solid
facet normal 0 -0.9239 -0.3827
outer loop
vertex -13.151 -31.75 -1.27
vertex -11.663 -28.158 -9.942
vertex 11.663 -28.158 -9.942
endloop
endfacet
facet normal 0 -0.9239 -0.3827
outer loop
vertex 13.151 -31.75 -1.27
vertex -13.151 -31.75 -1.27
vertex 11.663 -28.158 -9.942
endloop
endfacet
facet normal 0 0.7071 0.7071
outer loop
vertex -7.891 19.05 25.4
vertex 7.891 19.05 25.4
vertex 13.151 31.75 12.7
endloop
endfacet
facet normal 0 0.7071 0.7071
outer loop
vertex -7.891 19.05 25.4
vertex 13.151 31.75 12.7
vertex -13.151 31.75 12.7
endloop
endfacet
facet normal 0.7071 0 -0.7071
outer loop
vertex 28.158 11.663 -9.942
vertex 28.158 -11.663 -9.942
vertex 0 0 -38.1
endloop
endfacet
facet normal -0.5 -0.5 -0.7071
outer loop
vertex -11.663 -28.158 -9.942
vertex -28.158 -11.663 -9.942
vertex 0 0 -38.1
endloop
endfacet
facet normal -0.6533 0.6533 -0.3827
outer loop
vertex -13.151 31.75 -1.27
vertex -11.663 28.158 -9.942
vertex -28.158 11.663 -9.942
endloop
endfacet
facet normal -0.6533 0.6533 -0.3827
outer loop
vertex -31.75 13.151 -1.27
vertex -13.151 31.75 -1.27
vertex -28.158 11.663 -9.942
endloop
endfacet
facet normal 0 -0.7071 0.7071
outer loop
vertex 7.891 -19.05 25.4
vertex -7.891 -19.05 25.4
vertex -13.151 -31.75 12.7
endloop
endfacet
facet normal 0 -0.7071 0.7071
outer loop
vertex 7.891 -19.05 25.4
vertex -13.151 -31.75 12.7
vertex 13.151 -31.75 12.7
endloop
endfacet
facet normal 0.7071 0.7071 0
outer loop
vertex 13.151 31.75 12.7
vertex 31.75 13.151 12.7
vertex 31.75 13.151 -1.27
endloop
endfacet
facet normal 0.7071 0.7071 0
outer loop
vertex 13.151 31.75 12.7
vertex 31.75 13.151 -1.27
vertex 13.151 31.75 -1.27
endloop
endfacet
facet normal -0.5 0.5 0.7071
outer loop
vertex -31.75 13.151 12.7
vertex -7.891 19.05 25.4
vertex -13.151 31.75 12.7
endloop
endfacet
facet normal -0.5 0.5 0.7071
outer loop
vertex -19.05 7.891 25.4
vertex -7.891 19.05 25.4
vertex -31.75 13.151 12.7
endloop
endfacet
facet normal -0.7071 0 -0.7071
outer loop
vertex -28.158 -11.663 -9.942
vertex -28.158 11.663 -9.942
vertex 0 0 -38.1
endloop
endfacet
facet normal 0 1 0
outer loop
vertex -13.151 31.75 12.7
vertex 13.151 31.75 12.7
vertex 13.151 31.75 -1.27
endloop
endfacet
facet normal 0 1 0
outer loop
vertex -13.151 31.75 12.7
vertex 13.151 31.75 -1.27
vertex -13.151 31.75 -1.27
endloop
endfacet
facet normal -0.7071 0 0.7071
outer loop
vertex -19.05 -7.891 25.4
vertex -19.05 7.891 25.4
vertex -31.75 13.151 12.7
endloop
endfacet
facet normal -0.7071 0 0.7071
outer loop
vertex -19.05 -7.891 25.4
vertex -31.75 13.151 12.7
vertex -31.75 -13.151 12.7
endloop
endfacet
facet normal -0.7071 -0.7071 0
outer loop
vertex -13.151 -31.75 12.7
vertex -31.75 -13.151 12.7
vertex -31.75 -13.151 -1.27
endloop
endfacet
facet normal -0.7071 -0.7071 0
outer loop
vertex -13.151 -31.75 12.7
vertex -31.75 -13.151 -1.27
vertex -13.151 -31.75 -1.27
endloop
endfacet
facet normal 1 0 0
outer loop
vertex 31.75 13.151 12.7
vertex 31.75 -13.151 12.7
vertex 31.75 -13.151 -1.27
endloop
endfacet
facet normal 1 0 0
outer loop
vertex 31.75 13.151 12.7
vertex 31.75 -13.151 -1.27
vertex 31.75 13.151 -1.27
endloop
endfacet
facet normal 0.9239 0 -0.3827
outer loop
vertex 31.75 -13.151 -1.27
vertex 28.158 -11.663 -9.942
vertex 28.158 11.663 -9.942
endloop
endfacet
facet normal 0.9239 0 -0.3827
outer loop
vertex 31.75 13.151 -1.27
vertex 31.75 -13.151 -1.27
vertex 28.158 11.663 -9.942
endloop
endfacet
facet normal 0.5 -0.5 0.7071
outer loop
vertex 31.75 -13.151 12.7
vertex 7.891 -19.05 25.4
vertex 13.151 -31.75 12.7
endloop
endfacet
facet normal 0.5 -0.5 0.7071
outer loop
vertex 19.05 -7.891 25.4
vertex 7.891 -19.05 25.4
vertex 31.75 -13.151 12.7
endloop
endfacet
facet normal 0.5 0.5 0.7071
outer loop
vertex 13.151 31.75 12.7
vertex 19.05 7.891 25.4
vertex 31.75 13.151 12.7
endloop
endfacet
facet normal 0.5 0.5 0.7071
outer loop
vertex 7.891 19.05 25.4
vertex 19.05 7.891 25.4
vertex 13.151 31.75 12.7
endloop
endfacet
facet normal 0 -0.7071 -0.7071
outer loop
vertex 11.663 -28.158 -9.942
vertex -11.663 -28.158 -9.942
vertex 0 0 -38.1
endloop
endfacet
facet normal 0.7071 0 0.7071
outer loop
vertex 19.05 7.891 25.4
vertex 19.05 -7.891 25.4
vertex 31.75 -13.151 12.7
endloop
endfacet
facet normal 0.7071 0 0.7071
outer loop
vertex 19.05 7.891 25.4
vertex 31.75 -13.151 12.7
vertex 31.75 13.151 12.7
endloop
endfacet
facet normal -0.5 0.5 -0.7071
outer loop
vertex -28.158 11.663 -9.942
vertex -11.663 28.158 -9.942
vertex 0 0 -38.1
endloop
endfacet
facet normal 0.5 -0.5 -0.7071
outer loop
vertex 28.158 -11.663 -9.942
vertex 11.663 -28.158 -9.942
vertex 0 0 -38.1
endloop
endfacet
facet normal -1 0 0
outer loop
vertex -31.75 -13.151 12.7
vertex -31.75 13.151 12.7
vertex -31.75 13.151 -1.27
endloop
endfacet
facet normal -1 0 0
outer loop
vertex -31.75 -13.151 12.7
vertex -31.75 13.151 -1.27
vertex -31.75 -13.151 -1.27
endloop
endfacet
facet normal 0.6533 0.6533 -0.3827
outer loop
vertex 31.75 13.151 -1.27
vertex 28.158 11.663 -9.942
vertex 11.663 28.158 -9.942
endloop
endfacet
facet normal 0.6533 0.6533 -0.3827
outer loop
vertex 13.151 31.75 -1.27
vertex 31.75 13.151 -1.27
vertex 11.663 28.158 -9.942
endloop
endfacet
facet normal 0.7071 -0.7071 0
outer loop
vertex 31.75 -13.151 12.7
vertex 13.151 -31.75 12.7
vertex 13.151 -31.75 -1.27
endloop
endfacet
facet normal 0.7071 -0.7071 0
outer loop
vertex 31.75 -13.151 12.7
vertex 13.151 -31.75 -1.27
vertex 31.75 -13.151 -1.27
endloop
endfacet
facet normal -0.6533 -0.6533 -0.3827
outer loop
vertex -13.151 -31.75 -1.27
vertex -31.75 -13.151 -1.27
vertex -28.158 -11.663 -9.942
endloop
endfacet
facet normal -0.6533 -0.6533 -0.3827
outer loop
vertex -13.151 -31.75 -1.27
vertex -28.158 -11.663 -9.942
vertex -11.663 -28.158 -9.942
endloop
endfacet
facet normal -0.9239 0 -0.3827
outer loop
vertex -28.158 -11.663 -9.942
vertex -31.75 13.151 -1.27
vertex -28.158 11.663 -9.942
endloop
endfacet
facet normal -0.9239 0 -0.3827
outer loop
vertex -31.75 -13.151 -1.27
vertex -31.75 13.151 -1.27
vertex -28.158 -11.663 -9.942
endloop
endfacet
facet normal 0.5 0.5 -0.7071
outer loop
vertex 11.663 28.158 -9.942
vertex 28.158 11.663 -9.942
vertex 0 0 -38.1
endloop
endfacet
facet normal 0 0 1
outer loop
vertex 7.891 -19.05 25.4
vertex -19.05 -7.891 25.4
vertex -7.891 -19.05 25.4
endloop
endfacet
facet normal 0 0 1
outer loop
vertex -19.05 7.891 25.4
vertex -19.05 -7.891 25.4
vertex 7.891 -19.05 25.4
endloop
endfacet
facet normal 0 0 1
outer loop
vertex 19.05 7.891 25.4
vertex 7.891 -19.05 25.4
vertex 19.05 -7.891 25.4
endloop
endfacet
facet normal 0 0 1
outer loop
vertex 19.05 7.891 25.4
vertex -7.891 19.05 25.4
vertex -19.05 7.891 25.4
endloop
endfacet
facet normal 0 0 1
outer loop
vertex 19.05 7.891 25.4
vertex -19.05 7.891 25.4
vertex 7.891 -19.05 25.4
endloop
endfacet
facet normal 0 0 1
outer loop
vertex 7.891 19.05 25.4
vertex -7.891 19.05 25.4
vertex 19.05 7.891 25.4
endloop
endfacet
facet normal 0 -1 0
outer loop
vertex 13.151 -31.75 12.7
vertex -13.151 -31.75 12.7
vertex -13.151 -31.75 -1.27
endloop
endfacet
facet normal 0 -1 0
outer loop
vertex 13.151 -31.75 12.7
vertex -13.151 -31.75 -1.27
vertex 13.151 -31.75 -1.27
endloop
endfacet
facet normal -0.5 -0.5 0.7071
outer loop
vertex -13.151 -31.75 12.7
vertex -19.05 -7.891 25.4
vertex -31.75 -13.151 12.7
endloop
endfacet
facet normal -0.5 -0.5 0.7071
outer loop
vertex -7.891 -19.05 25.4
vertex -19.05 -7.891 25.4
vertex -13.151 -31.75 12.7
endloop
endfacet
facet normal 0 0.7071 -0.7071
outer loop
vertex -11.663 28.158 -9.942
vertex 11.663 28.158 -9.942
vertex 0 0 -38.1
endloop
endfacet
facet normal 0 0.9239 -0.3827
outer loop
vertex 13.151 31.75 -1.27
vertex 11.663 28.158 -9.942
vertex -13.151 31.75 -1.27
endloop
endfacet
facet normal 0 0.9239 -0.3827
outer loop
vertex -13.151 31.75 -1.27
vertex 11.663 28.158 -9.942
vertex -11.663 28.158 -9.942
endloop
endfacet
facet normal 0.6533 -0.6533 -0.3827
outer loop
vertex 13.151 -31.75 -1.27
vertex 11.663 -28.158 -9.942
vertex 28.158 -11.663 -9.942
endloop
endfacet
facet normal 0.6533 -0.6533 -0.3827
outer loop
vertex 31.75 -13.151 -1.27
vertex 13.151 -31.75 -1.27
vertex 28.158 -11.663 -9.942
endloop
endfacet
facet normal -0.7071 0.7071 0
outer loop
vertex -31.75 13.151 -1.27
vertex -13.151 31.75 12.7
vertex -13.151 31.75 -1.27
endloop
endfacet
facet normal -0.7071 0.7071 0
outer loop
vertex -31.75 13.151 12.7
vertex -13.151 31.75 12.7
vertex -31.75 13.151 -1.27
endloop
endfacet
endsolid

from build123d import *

# Parameters (mm, degrees)
F1_DEPTH = 25.4
F2_SIZE  = 12.7
F3_DEPTH = 38.1
F4_SIZE  = 31.7499
F5_SIZE  = 5.08


# Not quite as in the source:
# - a fillet or chamfer is up to 0.001 mm smaller than in the source, because OpenCascade refuses the exact size


with BuildPart() as f1:
    # F0 (on Top) → F1 (new body)
    with BuildSketch(Plane.XY):
        Polygon((31.75, -13.1512806053), (31.75, 13.1512806053), (13.1512806053, 31.75), (-13.1512806053, 31.75), (-31.75, 13.1512806053), (-31.75, -13.1512806053), (-13.1512806053, -31.75), (13.1512806053, -31.75), align=None)
    extrude(amount=F1_DEPTH)

    # F2
    f2_edges = [f1.edges().sort_by_distance(p)[0] for p in [
        (-31.75, 0, 25.4),
        (-22.45064, -22.45064, 25.4),
        (0, -31.75, 25.4),
        (22.45064, -22.45064, 25.4),
        (31.75, 0, 25.4),
        (22.45064, 22.45064, 25.4),
        (0, 31.75, 25.4),
        (-22.45064, 22.45064, 25.4),
    ]]
    chamfer(f2_edges, length=F2_SIZE)

    # F3 (add): a face of the model
    f3_faces = [f1.faces().sort_by_distance(p)[0] for p in [
        (0, 0, 0),
    ]]
    extrude(f3_faces, amount=F3_DEPTH)

    # F4 (size 31.75 in the source; OpenCascade refuses exactly that, so slightly less here)
    f4_edges = [f1.edges().sort_by_distance(p)[0] for p in [
        (-22.45064, -22.45064, -38.1),
        (0, -31.75, -38.1),
        (22.45064, -22.45064, -38.1),
        (-31.75, 0, -38.1),
        (-22.45064, 22.45064, -38.1),
        (0, 31.75, -38.1),
        (22.45064, 22.45064, -38.1),
        (31.75, 0, -38.1),
    ]]
    chamfer(f4_edges, length=F4_SIZE)

    # F5
    f5_edges = [f1.edges().sort_by_distance(p)[0] for p in [
        (-31.75, 0, -6.3501),
        (-22.45064, 22.45064, -6.3501),
        (-22.45064, -22.45064, -6.3501),
        (0, -31.75, -6.3501),
        (22.45064, -22.45064, -6.3501),
        (31.75, 0, -6.3501),
        (22.45064, 22.45064, -6.3501),
        (0, 31.75, -6.3501),
    ]]
    chamfer(f5_edges, length=F5_SIZE)


solid = f1.part
